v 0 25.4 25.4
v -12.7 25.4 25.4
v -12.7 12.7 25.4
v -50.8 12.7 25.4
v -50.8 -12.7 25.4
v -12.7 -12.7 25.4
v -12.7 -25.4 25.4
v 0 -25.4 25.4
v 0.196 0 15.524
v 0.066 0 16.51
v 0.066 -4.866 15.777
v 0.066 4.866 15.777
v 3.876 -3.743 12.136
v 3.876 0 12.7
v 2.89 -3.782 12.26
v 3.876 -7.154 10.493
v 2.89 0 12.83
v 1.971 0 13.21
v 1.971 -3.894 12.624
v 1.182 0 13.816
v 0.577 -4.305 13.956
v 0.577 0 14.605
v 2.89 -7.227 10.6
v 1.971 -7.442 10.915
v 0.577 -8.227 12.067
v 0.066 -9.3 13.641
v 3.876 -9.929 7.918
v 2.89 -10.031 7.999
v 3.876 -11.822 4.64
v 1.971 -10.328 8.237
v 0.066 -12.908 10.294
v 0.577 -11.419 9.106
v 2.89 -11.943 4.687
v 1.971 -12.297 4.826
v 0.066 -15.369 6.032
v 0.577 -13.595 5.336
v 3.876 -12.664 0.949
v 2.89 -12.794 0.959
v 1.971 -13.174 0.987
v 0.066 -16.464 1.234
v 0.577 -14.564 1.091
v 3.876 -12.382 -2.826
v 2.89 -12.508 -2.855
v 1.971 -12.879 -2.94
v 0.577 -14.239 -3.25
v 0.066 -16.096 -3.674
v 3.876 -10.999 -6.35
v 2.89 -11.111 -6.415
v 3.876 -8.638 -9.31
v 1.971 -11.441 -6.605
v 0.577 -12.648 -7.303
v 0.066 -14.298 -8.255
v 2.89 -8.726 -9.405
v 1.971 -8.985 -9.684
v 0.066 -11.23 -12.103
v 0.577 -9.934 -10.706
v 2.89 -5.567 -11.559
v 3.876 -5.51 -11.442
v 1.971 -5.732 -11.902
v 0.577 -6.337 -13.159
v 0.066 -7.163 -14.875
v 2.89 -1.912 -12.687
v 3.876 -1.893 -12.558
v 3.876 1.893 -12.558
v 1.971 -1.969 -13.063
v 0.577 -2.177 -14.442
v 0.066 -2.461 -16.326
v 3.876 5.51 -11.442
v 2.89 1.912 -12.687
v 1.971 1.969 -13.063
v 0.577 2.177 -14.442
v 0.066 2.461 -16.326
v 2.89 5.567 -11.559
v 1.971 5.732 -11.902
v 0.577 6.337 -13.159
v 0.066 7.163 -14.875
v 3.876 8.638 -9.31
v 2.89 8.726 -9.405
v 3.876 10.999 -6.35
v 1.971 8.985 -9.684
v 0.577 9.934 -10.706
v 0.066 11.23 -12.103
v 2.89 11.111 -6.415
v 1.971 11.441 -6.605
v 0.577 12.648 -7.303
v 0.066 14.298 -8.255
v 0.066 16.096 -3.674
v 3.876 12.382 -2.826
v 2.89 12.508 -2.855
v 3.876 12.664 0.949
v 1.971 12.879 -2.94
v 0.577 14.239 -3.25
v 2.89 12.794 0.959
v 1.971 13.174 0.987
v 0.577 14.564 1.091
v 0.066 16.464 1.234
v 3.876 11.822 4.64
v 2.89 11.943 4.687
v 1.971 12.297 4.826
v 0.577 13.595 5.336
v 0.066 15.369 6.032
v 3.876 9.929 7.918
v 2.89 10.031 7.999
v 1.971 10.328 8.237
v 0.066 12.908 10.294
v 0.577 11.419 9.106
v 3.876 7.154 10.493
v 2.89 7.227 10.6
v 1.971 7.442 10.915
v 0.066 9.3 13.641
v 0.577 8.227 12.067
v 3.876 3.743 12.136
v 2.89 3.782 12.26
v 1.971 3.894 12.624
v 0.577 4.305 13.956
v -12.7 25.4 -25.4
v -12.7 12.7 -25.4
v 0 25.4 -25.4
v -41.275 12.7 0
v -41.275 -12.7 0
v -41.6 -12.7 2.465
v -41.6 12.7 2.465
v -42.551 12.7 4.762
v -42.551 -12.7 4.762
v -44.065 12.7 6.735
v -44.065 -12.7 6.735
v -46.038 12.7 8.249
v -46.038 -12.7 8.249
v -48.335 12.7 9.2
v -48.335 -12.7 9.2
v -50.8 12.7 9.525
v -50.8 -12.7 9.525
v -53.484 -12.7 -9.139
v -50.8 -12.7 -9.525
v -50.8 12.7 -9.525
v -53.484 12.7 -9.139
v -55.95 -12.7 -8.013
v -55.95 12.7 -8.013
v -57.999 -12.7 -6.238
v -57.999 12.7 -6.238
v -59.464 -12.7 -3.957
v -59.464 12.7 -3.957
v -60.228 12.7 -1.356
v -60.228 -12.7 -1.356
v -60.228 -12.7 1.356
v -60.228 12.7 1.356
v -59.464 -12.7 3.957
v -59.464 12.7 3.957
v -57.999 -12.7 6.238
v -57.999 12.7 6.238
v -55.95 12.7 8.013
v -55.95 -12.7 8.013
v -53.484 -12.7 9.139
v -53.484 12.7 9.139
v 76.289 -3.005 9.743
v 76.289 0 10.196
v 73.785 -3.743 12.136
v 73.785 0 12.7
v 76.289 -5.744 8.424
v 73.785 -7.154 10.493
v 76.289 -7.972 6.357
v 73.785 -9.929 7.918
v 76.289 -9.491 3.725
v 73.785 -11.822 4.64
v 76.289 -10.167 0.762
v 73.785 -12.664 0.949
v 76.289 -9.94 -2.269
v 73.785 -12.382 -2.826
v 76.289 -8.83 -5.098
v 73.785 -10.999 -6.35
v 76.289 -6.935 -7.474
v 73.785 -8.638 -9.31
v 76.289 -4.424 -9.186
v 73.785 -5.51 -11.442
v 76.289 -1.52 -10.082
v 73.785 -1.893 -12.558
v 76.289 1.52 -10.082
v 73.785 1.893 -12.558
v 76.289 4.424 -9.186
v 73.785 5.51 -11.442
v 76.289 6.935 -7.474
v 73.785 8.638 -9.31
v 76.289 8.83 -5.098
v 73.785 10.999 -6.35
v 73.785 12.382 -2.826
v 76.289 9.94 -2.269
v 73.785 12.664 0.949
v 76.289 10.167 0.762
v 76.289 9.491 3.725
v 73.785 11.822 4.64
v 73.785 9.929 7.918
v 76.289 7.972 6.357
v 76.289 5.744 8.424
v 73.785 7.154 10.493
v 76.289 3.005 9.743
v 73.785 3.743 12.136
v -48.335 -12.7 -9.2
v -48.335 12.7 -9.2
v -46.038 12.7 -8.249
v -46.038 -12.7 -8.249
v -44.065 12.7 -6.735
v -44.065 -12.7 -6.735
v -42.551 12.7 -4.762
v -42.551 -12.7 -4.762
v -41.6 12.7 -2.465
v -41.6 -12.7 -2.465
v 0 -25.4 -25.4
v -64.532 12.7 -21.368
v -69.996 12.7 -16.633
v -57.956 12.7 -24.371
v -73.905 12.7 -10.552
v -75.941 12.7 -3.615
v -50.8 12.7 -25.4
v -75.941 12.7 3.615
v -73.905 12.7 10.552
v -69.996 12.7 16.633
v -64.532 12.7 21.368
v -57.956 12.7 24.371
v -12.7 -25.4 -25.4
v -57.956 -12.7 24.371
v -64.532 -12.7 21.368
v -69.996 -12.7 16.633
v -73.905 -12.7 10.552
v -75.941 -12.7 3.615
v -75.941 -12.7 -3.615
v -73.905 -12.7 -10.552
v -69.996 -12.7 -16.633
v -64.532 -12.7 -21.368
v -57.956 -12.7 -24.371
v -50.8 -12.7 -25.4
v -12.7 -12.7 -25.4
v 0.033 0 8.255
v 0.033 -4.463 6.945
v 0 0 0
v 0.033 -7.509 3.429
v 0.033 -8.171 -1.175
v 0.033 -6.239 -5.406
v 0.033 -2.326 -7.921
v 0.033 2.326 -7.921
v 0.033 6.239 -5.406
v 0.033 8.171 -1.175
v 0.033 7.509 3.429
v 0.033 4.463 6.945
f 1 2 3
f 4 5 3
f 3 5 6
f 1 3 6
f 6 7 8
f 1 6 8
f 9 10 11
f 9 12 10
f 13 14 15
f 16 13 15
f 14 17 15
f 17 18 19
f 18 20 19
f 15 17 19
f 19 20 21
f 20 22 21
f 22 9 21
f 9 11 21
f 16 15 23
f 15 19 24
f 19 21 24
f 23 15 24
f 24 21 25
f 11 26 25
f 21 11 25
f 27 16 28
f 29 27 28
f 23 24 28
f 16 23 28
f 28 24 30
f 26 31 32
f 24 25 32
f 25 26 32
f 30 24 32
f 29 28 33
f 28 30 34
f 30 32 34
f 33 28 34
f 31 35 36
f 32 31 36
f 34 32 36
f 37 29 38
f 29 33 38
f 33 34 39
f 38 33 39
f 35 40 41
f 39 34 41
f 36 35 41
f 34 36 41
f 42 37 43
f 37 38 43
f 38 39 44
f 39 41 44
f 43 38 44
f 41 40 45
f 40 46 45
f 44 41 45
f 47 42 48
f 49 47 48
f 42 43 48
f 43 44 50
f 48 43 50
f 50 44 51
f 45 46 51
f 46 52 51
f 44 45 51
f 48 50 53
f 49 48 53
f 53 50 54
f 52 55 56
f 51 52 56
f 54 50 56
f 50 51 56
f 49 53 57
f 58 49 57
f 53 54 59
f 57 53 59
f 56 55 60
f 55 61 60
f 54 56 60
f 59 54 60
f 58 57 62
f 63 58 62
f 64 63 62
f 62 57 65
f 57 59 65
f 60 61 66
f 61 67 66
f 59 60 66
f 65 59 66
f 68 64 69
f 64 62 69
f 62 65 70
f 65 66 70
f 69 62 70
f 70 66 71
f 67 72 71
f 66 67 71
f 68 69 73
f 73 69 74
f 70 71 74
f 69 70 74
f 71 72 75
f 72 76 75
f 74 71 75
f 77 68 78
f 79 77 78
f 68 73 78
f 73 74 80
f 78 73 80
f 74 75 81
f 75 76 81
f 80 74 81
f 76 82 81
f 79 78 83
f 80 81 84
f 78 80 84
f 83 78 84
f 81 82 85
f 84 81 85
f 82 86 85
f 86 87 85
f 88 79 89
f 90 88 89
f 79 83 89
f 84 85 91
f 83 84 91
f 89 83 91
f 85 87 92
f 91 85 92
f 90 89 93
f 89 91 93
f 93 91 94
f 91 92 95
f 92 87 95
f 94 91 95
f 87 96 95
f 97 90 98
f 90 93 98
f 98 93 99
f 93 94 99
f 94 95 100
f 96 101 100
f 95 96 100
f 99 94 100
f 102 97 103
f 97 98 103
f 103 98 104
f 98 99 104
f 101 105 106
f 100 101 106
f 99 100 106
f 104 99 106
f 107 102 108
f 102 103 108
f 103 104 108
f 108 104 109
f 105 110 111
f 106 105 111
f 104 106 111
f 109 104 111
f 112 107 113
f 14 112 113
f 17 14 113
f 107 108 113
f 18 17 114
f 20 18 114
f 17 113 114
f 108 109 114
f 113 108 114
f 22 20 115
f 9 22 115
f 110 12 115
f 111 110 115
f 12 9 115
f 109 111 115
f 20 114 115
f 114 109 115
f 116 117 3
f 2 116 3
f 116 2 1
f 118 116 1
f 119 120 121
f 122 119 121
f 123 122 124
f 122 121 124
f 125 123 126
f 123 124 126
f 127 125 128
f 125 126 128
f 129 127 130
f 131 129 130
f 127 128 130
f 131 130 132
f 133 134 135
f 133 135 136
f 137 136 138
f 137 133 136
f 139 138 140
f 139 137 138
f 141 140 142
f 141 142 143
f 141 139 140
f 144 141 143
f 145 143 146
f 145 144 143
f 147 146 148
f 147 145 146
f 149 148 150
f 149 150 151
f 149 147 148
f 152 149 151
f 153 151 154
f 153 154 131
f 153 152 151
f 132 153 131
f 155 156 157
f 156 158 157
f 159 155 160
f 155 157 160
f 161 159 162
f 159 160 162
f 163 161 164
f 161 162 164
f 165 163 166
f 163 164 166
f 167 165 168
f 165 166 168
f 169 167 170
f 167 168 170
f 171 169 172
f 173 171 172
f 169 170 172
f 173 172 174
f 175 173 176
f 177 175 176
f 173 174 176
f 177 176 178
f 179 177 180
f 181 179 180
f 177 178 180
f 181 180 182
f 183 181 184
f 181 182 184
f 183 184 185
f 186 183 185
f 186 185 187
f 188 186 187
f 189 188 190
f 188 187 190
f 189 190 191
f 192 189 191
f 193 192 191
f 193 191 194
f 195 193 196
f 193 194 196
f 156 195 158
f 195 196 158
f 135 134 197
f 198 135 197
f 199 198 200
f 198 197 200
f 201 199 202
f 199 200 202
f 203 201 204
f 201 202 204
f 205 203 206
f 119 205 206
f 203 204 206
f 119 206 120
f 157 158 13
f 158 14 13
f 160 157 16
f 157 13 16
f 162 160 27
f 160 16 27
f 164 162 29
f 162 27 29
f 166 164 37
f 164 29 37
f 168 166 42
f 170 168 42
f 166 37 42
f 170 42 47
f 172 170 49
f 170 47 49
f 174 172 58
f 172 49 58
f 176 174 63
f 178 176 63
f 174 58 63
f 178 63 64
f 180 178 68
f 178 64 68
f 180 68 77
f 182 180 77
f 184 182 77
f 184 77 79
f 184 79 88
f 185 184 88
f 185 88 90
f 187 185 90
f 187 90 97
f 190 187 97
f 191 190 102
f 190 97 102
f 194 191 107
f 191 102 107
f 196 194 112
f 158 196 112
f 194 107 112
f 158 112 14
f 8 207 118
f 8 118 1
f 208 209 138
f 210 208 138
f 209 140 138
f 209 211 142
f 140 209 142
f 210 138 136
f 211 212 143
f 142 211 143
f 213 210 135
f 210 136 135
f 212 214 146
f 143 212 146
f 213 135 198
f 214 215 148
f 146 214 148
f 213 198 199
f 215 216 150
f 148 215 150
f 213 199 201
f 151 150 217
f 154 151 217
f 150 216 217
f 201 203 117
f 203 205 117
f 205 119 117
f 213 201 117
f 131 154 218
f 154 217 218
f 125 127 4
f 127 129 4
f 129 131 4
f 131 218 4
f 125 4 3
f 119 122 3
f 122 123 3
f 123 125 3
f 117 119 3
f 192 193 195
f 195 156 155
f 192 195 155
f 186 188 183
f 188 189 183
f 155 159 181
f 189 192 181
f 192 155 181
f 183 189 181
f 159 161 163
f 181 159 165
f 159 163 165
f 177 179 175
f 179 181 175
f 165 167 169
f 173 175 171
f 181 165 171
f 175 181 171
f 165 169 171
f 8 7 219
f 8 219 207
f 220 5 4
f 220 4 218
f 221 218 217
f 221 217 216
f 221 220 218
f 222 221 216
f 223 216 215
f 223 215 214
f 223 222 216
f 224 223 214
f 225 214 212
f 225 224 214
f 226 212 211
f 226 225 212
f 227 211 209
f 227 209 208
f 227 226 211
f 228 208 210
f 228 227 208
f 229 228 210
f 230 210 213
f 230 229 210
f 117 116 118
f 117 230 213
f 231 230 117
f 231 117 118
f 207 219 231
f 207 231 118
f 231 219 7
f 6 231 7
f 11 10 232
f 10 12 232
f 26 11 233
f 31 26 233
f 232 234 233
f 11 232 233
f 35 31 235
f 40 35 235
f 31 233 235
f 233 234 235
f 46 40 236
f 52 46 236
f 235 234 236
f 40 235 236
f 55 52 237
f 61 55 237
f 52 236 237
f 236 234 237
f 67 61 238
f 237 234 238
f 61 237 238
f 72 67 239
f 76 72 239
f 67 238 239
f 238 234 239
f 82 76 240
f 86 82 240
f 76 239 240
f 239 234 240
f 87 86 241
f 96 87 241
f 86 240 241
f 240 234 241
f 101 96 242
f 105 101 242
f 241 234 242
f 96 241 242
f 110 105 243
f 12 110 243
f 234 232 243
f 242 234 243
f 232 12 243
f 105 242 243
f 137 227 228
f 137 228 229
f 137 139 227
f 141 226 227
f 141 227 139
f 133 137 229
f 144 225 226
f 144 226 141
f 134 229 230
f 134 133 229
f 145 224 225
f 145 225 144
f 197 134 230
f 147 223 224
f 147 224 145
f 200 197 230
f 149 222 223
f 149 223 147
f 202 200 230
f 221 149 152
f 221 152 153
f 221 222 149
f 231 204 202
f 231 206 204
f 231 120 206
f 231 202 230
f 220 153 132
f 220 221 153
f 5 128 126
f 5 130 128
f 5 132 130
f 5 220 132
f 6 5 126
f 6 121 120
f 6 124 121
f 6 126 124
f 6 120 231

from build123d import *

# Parameters (mm, degrees)
F1_W     = 12.7
F1_H     = 50.8
F2_DEPTH = 25.4
F4_W     = 25.4
F4_H     = 50.8
F5_DEPTH = 38.1
F7_DEPTH = 25.4
F8_DEPTH = 25.4


with BuildPart() as f2:
    # F1 (on Front) → F2 (new body, symmetric)
    with BuildSketch(Plane.XZ):
        with Locations((-6.35, 0)):
            Rectangle(F1_W, F1_H)
    extrude(amount=F2_DEPTH, both=True)

    # F0 (on Front) → F3 (revolve)
    with BuildSketch(Plane.XZ):
        with BuildLine():
            Line((73.785126, 12.7), (3.876444, 12.7))
            ThreePointArc((3.876444, 12.7), (1.182368, 13.815923), (0.066444, 16.51))
            Line((0.066444, 16.51), (0, 0))
            Line((0, 0), (49.949444, 0))
            Line((49.949444, 0), (76.289154, 0))
            Line((76.289154, 0), (76.289154, 10.195972))
            Line((76.289154, 10.195972), (73.785126, 12.7))
        make_face()
    revolve(axis=Axis((-4.930185, 0, 0), (1, 0, 0)))

    # F4 (on face) → F5 (join)
    with BuildSketch(Plane(origin=(-12.7, 0, 0), x_dir=(0, -1, 0), z_dir=(-1, 0, 0))):
        Rectangle(F4_W, F4_H)
    extrude(amount=F5_DEPTH)

    # F6 (on face) → F7 (join)
    with BuildSketch(Plane.XZ.offset(12.7)):
        with BuildLine():
            Line((-50.8, 9.525), (-50.8, 25.4))
            ThreePointArc((-50.8, 25.4), (-76.2, 0), (-50.8, -25.4))
            Line((-50.8, -25.4), (-50.8, -9.525))
            ThreePointArc((-50.8, -9.525), (-60.325, 0), (-50.8, 9.525))
        make_face()
        with BuildLine():
            ThreePointArc((-41.275, 0), (-44.064808, 6.735192), (-50.8, 9.525))
            Line((-50.8, 9.525), (-50.8, -9.525))
            ThreePointArc((-50.8, -9.525), (-44.064808, -6.735192), (-41.275, 0))
        make_face()
    extrude(amount=-F7_DEPTH)

    # F6 (on face) → F8 (cut)
    with BuildSketch(Plane.XZ.offset(12.7)):
        with BuildLine():
            Line((-50.8, -9.525), (-50.8, 9.525))
            ThreePointArc((-50.8, 9.525), (-60.325, 0), (-50.8, -9.525))
        make_face()
        with BuildLine():
            ThreePointArc((-41.275, 0), (-44.064808, 6.735192), (-50.8, 9.525))
            Line((-50.8, 9.525), (-50.8, -9.525))
            ThreePointArc((-50.8, -9.525), (-44.064808, -6.735192), (-41.275, 0))
        make_face()
    extrude(amount=-F8_DEPTH, mode=Mode.SUBTRACT)


solid = f2.part
